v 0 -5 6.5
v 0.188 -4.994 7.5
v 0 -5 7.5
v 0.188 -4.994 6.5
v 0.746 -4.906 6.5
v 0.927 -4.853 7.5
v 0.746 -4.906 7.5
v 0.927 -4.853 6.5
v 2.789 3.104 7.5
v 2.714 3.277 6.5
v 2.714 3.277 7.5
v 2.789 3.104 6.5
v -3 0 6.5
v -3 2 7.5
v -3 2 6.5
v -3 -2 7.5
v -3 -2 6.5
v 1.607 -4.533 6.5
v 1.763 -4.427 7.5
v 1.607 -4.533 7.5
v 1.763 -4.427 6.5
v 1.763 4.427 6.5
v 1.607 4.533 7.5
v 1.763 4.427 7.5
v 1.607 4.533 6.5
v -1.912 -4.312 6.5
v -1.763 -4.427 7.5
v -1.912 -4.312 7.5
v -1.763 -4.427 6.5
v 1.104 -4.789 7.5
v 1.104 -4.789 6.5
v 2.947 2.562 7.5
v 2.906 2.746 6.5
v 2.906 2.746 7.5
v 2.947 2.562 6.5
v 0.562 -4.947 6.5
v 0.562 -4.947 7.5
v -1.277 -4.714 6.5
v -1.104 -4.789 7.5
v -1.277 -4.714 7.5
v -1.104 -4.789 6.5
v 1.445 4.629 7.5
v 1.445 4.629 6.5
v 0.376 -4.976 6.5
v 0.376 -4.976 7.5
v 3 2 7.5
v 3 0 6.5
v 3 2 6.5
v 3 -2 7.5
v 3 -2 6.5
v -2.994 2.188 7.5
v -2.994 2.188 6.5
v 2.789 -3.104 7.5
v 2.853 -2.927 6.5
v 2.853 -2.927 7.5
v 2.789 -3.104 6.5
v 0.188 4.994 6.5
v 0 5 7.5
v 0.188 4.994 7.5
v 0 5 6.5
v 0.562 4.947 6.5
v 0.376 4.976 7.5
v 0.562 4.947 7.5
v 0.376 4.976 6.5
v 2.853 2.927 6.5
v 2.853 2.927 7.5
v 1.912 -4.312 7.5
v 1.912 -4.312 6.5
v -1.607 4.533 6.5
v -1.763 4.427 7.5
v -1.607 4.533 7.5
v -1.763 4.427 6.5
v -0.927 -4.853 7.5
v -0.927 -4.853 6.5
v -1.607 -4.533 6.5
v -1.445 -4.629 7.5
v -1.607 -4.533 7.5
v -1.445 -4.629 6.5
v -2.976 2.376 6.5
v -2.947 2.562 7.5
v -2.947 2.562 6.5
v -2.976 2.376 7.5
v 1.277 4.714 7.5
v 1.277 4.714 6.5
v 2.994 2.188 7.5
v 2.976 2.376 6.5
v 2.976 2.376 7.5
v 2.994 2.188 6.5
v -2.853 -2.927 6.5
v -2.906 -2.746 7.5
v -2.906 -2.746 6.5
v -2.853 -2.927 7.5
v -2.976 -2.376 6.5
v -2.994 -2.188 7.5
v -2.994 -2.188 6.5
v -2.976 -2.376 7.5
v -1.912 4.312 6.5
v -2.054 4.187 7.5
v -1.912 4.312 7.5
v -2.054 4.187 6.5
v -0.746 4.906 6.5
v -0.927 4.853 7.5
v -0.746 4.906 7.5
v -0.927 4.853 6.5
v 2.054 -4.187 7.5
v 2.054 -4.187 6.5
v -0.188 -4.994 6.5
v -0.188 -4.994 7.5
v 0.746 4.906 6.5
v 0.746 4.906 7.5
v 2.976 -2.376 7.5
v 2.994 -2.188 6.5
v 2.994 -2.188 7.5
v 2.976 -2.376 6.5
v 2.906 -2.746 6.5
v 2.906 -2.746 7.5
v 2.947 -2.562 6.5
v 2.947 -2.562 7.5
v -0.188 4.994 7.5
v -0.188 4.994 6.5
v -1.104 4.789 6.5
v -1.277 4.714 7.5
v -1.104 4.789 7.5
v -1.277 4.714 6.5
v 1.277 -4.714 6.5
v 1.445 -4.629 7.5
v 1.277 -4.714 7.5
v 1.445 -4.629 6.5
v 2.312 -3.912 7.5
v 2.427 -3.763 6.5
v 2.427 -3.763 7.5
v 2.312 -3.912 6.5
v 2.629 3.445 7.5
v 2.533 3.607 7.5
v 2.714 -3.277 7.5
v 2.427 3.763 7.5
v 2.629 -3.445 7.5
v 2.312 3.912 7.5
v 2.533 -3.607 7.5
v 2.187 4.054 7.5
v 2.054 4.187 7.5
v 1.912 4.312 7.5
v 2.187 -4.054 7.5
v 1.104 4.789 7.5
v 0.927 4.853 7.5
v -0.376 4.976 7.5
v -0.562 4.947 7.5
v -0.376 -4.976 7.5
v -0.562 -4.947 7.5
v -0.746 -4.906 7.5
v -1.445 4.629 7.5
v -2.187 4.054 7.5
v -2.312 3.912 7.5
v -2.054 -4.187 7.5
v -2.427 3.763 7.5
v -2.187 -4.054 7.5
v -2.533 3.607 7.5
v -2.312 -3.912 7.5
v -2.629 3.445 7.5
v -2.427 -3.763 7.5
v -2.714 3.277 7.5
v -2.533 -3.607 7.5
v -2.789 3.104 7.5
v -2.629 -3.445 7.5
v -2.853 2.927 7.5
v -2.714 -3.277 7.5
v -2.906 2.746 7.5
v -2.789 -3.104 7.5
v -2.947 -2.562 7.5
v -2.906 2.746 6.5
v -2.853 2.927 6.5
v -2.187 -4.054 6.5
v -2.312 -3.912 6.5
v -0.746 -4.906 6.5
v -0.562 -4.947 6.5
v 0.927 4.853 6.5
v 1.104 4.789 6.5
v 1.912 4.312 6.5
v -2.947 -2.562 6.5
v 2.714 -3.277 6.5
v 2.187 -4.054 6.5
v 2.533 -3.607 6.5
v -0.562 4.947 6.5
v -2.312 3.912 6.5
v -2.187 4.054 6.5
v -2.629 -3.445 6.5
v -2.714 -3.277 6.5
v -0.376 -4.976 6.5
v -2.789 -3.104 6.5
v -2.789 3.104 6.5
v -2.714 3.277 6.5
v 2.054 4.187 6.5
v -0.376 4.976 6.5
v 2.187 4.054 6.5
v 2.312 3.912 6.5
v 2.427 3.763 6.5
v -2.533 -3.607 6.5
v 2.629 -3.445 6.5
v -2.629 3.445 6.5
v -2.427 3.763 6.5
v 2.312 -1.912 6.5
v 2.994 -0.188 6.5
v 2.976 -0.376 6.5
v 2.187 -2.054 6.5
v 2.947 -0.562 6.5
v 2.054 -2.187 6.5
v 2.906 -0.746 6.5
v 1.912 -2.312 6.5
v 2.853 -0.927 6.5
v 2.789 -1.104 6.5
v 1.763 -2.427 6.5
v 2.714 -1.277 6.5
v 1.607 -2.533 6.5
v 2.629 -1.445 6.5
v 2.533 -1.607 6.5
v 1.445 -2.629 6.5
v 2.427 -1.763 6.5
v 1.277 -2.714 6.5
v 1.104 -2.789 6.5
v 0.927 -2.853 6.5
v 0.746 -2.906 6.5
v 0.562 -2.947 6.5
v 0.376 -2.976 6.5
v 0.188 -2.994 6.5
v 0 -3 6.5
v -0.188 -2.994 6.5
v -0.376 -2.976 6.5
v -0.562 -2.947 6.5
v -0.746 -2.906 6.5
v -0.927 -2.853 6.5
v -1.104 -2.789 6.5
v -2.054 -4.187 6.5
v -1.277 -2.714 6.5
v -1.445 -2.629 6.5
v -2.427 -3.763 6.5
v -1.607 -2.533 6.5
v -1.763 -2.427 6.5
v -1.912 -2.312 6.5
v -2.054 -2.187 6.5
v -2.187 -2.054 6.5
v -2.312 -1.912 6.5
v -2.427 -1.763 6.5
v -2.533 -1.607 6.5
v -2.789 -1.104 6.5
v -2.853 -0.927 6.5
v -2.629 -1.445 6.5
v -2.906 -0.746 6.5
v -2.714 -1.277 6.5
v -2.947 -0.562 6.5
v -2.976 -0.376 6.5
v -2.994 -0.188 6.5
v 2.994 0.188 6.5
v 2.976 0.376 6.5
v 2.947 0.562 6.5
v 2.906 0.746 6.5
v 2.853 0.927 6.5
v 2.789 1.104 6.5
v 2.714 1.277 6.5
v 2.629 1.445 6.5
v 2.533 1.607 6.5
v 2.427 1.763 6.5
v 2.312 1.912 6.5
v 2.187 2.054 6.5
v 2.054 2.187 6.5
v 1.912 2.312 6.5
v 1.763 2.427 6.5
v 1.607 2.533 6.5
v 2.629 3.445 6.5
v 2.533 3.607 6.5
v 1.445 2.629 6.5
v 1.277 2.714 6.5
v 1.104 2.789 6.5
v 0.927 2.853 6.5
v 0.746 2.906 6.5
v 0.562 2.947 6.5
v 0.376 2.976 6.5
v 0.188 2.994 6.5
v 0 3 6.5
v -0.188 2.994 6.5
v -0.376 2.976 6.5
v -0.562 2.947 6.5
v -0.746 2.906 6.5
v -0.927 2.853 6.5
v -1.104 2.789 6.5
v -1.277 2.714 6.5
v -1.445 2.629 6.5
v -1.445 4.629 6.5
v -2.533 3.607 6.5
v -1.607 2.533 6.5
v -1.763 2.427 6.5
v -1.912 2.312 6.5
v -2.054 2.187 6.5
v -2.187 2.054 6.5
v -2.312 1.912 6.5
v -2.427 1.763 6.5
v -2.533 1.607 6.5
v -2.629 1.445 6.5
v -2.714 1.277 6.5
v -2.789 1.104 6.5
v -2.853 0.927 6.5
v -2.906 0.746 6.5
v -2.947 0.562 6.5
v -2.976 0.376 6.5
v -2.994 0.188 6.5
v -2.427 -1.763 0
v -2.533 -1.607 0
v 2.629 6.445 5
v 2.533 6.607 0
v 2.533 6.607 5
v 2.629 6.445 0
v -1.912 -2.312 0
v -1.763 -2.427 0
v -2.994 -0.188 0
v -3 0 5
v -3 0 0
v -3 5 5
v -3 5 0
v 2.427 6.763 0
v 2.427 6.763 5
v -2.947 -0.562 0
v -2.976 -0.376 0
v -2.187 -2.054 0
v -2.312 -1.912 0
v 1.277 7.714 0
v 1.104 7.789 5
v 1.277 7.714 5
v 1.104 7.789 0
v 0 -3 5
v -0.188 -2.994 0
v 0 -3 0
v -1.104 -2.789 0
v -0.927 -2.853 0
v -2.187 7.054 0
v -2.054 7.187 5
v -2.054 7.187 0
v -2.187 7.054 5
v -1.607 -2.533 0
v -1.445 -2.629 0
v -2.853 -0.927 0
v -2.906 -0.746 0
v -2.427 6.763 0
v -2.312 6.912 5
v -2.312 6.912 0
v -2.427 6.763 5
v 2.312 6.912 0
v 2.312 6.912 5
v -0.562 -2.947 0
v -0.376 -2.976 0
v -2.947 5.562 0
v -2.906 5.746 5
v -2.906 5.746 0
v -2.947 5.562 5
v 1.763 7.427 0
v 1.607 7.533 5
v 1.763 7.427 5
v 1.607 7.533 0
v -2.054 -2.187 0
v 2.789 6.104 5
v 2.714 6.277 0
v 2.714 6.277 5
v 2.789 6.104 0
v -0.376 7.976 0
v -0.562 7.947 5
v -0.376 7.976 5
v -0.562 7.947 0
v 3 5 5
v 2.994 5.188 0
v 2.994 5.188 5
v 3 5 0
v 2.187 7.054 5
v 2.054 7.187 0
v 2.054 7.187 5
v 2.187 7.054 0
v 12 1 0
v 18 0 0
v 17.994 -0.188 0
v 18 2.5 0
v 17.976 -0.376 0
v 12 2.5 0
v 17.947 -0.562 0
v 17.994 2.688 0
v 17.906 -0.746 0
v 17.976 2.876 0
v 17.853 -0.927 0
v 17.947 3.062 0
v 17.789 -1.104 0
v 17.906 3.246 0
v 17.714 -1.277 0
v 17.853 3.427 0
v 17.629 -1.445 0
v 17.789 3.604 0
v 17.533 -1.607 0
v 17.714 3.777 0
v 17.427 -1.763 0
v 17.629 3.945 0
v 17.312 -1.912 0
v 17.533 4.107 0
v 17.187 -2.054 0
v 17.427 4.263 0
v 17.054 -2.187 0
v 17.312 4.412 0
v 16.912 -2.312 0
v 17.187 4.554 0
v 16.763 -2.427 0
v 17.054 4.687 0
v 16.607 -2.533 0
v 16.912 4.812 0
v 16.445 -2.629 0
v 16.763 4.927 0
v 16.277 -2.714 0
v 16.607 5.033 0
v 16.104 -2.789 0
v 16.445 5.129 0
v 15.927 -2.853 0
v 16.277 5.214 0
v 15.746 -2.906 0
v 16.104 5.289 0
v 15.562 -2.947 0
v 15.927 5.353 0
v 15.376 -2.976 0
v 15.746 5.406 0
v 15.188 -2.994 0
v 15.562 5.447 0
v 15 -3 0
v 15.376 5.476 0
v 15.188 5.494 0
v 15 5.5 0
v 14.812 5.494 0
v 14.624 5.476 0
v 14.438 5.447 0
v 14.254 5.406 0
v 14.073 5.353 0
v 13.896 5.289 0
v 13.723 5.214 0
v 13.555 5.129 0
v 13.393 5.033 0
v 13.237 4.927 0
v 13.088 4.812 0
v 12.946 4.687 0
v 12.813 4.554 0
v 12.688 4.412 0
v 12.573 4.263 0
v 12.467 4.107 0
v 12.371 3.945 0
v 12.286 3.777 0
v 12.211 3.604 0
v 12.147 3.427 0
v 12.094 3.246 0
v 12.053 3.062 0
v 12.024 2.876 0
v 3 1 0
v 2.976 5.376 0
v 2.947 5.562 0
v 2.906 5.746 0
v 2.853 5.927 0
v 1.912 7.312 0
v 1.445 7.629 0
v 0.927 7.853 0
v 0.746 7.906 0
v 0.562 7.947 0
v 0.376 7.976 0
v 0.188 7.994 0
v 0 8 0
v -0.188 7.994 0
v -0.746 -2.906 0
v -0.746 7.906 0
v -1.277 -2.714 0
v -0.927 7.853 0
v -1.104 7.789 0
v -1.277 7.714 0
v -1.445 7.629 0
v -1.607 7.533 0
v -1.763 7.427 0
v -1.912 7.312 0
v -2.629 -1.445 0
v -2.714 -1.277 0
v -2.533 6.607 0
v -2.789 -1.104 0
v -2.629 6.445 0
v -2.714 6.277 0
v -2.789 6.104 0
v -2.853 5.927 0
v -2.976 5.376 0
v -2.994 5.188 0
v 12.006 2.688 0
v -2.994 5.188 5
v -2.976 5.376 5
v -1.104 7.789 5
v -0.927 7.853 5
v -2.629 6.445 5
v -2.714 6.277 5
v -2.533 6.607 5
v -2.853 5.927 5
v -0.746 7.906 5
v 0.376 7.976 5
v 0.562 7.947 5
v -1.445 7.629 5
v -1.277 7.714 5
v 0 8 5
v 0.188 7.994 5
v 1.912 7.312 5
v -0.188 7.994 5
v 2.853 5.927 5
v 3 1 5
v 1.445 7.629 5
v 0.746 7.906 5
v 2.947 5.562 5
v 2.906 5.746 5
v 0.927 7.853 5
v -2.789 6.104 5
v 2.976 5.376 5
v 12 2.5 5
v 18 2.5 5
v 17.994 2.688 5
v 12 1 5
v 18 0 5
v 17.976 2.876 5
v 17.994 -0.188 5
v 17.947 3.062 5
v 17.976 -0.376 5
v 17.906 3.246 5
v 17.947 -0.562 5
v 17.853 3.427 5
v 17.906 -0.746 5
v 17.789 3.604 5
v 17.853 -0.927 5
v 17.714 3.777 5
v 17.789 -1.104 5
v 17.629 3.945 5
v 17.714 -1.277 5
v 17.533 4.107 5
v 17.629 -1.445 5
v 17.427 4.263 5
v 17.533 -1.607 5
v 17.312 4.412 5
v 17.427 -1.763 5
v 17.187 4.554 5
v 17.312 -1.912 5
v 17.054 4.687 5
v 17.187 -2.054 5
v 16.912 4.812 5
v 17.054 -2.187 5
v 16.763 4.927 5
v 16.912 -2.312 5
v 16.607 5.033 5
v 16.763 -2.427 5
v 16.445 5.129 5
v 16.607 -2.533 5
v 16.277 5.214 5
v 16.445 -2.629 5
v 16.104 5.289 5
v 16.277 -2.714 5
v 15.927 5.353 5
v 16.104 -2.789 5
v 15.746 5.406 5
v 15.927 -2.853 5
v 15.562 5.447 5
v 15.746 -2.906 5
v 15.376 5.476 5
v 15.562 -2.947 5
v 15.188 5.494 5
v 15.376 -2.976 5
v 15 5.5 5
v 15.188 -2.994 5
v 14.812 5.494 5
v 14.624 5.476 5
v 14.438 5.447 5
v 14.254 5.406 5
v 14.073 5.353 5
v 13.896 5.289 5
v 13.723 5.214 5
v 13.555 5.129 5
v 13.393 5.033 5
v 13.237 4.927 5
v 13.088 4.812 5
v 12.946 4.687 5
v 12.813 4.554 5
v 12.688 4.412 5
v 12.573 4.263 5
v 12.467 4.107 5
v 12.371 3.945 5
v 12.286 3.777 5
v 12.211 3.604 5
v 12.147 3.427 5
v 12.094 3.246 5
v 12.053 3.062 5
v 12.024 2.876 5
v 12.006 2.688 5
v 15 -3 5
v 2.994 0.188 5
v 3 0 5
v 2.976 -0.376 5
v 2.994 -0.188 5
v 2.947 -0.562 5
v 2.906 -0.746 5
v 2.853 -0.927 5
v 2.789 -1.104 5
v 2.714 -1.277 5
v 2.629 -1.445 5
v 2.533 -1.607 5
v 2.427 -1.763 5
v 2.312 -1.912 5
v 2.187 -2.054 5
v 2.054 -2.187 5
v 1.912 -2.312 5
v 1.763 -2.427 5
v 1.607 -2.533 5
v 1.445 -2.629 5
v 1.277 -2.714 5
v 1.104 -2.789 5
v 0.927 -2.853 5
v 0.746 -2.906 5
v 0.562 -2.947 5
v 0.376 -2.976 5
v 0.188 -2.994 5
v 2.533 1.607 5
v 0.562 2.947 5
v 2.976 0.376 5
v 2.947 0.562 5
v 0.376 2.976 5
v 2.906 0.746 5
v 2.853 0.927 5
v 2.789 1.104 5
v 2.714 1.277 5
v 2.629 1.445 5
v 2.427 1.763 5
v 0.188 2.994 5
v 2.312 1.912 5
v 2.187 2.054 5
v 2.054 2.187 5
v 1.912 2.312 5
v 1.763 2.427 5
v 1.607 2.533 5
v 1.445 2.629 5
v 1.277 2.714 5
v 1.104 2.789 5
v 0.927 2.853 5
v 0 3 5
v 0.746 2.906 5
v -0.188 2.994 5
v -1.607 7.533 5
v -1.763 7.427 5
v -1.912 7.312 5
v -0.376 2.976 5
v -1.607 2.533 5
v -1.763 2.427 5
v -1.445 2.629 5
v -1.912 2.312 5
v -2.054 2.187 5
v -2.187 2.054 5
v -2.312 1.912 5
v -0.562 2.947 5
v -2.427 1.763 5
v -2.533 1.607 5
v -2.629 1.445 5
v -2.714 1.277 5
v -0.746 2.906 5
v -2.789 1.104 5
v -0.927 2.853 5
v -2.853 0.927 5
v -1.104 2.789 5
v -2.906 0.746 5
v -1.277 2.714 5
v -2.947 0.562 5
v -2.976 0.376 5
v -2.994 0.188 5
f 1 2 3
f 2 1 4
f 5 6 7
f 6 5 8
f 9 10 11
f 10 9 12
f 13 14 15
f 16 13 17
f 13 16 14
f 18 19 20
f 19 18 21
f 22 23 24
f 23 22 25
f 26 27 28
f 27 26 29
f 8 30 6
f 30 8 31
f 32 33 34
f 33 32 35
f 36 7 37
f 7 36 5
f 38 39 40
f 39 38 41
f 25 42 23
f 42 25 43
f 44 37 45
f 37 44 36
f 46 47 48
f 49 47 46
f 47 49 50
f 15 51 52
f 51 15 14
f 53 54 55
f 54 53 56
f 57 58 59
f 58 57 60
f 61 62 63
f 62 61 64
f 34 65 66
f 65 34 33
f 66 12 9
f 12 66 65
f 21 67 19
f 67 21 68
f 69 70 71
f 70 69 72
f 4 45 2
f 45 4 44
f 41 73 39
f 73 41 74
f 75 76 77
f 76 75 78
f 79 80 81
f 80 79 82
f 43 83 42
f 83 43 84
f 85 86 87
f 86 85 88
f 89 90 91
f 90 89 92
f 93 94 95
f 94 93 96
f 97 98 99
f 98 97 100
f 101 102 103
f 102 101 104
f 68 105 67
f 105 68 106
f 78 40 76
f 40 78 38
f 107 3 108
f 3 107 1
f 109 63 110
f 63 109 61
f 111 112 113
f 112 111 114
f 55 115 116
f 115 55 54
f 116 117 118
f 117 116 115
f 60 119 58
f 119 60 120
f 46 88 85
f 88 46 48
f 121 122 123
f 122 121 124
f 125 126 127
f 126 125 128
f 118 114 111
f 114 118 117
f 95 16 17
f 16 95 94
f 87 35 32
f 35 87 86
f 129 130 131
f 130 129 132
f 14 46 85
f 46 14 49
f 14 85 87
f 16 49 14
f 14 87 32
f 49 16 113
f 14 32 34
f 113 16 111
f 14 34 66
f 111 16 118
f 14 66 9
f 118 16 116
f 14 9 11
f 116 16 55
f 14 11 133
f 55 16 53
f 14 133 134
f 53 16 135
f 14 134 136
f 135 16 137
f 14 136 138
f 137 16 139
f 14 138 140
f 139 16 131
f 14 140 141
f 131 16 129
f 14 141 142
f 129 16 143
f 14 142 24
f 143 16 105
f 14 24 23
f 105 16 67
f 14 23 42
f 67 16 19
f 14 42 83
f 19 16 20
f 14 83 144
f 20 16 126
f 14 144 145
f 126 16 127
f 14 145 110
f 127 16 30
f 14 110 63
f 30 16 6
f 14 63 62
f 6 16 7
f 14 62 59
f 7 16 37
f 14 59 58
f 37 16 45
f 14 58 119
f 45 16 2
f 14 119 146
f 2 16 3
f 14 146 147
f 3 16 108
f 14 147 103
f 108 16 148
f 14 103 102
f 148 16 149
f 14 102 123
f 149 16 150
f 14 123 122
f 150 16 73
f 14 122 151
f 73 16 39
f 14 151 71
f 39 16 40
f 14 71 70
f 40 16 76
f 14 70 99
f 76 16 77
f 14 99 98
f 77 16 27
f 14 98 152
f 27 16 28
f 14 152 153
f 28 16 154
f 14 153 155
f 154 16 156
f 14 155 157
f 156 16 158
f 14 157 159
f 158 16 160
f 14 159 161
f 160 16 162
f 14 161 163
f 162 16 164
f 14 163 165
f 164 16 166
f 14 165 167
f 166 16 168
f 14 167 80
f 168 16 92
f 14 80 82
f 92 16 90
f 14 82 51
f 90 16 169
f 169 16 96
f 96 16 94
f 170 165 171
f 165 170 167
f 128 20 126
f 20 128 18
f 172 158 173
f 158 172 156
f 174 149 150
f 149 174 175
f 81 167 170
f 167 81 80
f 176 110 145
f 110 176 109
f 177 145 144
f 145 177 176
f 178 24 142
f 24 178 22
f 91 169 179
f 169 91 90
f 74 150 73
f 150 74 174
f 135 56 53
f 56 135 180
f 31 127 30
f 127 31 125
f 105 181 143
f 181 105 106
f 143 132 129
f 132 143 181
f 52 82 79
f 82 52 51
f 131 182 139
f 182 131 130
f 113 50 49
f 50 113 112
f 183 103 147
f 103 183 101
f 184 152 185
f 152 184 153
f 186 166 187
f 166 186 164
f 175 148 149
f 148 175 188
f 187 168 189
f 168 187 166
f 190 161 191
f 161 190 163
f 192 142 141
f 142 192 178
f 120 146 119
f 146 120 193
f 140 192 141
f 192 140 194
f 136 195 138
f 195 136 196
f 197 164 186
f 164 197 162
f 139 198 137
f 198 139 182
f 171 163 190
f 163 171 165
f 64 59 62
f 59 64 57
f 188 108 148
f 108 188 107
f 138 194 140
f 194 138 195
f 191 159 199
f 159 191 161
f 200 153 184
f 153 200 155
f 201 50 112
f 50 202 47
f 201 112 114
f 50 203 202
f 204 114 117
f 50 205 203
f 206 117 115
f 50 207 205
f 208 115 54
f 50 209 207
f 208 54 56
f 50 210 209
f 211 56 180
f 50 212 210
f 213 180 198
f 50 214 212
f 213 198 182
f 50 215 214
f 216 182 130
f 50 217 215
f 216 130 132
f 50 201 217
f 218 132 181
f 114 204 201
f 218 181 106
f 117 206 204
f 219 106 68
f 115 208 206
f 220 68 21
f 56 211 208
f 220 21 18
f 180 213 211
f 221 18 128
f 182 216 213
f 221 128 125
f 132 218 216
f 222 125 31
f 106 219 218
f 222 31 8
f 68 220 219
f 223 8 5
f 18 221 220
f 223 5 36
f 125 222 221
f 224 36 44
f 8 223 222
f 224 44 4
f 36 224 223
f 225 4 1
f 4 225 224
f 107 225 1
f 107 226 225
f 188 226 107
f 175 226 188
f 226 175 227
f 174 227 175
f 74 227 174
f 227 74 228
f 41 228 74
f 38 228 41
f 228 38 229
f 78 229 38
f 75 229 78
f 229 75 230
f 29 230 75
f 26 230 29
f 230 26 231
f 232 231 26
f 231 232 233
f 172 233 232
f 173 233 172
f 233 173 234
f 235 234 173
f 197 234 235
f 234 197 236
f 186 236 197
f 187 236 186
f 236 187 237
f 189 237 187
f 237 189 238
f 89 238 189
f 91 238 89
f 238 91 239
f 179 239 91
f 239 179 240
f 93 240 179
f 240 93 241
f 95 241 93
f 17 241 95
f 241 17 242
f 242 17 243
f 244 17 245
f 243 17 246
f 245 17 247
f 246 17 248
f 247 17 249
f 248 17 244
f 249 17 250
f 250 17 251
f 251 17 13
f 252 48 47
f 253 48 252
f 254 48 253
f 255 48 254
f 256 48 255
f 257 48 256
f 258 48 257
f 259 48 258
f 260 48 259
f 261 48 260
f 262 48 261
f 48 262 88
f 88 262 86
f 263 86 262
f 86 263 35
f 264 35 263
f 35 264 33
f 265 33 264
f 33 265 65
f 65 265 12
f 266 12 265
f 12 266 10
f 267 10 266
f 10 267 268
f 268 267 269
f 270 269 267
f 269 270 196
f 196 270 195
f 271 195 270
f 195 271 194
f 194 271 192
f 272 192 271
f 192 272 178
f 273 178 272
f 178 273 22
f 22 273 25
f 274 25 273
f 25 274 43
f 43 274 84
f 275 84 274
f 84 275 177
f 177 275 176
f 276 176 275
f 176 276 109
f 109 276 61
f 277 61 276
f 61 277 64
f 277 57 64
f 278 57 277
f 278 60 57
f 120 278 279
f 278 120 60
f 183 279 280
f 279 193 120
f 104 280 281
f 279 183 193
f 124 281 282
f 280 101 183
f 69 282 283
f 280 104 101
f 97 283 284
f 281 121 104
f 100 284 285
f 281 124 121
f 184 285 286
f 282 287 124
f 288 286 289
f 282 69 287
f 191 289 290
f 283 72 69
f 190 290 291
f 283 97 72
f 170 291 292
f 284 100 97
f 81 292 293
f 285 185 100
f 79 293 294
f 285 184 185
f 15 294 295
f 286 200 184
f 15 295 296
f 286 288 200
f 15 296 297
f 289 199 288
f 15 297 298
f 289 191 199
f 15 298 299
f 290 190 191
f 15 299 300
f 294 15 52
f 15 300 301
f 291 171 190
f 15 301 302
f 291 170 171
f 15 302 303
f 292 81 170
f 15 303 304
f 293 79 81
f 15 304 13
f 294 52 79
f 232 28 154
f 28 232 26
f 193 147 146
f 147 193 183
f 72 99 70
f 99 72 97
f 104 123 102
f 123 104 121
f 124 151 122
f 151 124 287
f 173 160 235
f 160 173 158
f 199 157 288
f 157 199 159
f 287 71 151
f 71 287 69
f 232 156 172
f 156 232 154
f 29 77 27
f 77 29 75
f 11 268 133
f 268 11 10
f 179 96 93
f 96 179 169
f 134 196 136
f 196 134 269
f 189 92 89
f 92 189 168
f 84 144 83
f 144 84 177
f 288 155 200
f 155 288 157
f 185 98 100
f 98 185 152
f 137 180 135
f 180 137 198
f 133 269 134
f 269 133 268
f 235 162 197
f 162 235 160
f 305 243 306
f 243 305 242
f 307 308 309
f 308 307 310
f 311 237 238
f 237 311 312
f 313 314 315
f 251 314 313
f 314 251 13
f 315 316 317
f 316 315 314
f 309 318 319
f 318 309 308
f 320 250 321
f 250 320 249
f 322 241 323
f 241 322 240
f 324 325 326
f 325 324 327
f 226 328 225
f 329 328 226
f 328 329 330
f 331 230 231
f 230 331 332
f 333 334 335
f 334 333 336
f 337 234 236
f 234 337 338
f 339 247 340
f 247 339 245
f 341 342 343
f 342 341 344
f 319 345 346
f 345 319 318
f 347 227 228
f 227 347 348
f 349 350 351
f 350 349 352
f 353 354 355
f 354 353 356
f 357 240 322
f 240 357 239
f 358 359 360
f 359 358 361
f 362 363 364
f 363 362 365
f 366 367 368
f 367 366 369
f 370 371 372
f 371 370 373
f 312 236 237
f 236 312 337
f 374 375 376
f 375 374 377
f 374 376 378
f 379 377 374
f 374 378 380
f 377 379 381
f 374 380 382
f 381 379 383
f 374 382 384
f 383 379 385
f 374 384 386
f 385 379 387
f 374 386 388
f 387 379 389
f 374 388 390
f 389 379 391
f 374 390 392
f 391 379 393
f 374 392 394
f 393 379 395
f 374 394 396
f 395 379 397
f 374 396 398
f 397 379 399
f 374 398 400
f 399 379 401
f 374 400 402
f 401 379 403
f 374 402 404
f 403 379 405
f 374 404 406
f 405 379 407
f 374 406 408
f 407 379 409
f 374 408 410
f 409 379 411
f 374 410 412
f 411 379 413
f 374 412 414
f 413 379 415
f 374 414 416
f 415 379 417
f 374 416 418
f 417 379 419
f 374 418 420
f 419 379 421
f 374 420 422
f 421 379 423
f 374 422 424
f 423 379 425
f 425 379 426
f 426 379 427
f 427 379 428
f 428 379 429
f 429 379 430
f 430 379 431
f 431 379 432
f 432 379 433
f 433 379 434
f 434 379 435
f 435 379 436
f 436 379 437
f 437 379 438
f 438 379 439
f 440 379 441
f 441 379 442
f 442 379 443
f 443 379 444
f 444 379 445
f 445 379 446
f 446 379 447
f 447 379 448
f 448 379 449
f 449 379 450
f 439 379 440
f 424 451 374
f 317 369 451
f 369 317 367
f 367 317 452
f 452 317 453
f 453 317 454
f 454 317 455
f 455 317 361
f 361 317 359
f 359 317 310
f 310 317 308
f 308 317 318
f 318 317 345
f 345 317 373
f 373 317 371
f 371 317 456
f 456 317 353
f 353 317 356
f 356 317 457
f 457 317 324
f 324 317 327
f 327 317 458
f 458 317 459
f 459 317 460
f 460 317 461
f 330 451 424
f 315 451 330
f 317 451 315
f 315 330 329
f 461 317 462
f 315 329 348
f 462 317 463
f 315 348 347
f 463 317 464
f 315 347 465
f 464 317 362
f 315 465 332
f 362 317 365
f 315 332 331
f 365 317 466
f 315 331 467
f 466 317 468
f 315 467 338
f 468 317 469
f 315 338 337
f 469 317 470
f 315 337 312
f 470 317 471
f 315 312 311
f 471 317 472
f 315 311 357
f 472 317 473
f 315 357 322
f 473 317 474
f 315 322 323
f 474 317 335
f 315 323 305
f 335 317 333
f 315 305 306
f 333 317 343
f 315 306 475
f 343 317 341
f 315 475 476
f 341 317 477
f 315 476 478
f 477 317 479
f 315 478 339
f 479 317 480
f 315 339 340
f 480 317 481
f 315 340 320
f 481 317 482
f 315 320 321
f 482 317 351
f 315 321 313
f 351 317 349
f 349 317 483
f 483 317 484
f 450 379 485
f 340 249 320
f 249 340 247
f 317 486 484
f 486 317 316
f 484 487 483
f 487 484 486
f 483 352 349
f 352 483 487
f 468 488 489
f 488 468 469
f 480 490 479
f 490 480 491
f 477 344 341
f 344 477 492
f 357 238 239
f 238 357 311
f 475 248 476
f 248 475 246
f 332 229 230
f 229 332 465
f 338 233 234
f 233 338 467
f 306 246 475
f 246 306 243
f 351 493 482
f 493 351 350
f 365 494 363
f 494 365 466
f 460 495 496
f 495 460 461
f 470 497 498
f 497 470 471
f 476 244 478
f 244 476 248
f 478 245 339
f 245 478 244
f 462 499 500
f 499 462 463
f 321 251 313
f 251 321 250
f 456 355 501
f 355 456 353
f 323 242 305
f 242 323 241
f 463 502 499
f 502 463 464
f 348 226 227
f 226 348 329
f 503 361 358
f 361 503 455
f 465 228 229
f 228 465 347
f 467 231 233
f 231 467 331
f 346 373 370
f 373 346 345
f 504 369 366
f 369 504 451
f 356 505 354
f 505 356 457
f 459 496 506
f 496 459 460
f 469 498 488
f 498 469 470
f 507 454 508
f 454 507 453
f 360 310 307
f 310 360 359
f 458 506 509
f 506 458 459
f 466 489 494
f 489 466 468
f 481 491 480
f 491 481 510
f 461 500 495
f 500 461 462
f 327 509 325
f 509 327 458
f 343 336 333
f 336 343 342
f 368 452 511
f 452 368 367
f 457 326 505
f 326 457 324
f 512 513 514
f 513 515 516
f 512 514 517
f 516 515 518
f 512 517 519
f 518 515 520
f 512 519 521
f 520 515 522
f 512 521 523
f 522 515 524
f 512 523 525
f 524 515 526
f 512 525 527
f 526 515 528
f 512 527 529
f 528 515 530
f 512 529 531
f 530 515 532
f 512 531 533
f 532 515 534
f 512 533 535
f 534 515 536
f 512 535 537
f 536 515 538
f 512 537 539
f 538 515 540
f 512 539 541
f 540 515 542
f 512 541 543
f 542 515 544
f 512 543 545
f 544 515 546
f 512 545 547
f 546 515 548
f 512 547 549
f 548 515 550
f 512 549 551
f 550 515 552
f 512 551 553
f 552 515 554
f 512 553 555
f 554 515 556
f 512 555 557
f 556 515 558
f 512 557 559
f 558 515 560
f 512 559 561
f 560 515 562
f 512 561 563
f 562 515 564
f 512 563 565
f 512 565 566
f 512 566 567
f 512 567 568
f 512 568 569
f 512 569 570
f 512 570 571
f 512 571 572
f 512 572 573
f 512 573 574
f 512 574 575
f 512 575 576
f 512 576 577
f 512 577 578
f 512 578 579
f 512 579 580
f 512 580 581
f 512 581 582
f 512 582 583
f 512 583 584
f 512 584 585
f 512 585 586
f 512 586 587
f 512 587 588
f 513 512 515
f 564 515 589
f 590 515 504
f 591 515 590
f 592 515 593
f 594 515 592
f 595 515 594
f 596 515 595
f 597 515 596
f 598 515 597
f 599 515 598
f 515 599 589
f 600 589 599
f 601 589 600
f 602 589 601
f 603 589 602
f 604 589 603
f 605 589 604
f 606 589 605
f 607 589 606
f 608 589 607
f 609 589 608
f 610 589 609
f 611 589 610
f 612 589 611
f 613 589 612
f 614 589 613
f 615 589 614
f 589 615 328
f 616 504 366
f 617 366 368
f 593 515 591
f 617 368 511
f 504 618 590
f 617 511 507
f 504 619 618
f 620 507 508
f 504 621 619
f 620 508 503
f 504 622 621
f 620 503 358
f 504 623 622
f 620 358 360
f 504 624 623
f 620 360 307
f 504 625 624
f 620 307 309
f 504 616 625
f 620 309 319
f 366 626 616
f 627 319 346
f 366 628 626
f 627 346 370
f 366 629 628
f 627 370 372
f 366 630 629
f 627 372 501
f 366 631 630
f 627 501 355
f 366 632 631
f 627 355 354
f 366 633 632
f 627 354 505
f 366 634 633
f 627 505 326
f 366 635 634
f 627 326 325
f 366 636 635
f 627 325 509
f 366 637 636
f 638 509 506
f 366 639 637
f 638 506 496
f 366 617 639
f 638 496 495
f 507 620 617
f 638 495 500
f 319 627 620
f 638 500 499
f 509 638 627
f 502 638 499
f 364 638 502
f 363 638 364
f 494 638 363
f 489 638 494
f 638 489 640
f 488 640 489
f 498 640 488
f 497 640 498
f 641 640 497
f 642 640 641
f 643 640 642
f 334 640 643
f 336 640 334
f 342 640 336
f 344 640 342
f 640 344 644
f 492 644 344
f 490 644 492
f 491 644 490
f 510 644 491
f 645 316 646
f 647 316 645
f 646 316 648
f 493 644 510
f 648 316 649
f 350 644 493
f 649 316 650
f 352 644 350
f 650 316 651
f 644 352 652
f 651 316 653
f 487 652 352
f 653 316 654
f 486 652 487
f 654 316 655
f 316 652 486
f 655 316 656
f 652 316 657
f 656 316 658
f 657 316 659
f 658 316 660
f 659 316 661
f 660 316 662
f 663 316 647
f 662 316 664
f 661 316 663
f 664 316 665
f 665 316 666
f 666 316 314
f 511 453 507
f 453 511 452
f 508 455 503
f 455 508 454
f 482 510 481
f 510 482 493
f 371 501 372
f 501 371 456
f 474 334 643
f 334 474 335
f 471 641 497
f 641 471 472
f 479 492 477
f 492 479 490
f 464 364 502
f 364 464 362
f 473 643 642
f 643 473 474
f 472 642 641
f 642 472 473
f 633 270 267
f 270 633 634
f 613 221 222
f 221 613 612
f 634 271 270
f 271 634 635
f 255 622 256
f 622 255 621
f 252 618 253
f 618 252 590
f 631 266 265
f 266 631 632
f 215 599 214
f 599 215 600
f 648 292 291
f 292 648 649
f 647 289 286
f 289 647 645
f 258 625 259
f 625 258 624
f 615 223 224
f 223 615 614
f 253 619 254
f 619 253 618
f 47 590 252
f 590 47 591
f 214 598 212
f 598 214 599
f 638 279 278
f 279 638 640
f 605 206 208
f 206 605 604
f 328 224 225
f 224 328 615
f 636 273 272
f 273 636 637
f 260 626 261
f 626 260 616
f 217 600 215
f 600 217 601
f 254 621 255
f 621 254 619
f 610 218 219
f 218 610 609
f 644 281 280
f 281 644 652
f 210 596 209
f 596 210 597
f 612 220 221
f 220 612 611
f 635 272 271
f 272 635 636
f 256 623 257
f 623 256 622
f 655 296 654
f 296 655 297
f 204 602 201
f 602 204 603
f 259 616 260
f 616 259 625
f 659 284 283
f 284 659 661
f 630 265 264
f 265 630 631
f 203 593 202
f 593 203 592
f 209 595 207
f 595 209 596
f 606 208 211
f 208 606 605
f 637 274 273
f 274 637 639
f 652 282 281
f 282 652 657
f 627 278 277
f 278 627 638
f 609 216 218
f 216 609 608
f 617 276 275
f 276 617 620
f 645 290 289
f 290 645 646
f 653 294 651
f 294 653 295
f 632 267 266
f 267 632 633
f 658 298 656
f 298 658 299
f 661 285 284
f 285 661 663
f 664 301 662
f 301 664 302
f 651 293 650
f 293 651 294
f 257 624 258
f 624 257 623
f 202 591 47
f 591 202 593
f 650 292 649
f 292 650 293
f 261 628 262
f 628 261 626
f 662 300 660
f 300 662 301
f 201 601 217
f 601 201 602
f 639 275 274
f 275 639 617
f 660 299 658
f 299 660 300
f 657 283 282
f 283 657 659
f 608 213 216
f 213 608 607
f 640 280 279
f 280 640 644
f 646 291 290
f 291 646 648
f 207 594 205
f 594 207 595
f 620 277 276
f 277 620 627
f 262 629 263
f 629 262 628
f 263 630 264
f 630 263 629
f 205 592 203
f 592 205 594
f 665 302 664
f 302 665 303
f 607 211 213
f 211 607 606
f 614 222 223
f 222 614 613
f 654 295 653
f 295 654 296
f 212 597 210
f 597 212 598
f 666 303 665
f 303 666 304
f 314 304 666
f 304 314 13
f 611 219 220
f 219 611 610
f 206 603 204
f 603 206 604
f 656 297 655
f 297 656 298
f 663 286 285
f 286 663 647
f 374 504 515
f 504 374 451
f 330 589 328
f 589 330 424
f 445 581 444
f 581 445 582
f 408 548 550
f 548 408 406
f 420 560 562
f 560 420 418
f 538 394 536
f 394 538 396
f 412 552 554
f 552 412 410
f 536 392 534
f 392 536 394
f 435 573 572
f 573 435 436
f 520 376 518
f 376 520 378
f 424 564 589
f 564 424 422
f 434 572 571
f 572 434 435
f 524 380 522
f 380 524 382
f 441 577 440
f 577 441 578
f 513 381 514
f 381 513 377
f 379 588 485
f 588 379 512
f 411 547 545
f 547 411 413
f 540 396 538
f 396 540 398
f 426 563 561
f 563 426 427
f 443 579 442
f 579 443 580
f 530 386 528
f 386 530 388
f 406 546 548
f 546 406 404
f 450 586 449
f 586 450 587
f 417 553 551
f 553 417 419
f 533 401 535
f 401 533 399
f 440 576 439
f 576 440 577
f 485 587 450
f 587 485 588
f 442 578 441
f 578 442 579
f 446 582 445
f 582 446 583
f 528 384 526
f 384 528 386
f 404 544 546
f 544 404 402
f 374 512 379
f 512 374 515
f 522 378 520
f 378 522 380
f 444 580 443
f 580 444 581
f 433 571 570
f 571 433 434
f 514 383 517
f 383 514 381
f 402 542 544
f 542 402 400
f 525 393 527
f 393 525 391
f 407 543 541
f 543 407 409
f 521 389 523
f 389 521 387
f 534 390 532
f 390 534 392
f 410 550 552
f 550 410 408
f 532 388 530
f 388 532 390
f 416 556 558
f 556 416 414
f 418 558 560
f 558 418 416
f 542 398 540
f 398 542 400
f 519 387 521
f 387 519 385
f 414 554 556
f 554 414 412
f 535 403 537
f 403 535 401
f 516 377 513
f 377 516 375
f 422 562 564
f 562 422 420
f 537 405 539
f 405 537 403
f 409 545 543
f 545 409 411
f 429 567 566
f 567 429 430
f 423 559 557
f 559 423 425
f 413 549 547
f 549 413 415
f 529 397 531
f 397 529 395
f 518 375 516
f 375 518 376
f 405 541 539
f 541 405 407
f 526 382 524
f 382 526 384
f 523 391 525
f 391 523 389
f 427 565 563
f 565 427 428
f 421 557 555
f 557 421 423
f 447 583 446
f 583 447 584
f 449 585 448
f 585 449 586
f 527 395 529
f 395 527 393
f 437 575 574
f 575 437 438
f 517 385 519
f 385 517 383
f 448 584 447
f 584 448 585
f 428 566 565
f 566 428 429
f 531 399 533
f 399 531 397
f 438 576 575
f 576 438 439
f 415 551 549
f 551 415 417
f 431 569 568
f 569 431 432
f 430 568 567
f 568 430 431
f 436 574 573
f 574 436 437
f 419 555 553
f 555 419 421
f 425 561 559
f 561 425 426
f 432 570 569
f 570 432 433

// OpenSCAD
hull(){
translate([0,2,6.5])
cylinder(r = 3,$fn = 100,h =1);
translate([0,-2,6.5])
cylinder(r = 3,$fn = 100,h =1);
}

hull(){
cylinder(r = 3,$fn = 100,h =5);
translate([0,5,0])
cylinder(r = 3,$fn = 100,h =5);
}

translate([0,0,5])
cylinder(r = 3,$fn = 100,h =2);

translate([7.5,-1,2.5])
cube([15,4,5],center = true);

hull(){
translate([15,0,0])
cylinder(r = 3,$fn = 100,h =5);


translate([15,2.5,0])
cylinder(r = 3,$fn = 100,h =5);
}
